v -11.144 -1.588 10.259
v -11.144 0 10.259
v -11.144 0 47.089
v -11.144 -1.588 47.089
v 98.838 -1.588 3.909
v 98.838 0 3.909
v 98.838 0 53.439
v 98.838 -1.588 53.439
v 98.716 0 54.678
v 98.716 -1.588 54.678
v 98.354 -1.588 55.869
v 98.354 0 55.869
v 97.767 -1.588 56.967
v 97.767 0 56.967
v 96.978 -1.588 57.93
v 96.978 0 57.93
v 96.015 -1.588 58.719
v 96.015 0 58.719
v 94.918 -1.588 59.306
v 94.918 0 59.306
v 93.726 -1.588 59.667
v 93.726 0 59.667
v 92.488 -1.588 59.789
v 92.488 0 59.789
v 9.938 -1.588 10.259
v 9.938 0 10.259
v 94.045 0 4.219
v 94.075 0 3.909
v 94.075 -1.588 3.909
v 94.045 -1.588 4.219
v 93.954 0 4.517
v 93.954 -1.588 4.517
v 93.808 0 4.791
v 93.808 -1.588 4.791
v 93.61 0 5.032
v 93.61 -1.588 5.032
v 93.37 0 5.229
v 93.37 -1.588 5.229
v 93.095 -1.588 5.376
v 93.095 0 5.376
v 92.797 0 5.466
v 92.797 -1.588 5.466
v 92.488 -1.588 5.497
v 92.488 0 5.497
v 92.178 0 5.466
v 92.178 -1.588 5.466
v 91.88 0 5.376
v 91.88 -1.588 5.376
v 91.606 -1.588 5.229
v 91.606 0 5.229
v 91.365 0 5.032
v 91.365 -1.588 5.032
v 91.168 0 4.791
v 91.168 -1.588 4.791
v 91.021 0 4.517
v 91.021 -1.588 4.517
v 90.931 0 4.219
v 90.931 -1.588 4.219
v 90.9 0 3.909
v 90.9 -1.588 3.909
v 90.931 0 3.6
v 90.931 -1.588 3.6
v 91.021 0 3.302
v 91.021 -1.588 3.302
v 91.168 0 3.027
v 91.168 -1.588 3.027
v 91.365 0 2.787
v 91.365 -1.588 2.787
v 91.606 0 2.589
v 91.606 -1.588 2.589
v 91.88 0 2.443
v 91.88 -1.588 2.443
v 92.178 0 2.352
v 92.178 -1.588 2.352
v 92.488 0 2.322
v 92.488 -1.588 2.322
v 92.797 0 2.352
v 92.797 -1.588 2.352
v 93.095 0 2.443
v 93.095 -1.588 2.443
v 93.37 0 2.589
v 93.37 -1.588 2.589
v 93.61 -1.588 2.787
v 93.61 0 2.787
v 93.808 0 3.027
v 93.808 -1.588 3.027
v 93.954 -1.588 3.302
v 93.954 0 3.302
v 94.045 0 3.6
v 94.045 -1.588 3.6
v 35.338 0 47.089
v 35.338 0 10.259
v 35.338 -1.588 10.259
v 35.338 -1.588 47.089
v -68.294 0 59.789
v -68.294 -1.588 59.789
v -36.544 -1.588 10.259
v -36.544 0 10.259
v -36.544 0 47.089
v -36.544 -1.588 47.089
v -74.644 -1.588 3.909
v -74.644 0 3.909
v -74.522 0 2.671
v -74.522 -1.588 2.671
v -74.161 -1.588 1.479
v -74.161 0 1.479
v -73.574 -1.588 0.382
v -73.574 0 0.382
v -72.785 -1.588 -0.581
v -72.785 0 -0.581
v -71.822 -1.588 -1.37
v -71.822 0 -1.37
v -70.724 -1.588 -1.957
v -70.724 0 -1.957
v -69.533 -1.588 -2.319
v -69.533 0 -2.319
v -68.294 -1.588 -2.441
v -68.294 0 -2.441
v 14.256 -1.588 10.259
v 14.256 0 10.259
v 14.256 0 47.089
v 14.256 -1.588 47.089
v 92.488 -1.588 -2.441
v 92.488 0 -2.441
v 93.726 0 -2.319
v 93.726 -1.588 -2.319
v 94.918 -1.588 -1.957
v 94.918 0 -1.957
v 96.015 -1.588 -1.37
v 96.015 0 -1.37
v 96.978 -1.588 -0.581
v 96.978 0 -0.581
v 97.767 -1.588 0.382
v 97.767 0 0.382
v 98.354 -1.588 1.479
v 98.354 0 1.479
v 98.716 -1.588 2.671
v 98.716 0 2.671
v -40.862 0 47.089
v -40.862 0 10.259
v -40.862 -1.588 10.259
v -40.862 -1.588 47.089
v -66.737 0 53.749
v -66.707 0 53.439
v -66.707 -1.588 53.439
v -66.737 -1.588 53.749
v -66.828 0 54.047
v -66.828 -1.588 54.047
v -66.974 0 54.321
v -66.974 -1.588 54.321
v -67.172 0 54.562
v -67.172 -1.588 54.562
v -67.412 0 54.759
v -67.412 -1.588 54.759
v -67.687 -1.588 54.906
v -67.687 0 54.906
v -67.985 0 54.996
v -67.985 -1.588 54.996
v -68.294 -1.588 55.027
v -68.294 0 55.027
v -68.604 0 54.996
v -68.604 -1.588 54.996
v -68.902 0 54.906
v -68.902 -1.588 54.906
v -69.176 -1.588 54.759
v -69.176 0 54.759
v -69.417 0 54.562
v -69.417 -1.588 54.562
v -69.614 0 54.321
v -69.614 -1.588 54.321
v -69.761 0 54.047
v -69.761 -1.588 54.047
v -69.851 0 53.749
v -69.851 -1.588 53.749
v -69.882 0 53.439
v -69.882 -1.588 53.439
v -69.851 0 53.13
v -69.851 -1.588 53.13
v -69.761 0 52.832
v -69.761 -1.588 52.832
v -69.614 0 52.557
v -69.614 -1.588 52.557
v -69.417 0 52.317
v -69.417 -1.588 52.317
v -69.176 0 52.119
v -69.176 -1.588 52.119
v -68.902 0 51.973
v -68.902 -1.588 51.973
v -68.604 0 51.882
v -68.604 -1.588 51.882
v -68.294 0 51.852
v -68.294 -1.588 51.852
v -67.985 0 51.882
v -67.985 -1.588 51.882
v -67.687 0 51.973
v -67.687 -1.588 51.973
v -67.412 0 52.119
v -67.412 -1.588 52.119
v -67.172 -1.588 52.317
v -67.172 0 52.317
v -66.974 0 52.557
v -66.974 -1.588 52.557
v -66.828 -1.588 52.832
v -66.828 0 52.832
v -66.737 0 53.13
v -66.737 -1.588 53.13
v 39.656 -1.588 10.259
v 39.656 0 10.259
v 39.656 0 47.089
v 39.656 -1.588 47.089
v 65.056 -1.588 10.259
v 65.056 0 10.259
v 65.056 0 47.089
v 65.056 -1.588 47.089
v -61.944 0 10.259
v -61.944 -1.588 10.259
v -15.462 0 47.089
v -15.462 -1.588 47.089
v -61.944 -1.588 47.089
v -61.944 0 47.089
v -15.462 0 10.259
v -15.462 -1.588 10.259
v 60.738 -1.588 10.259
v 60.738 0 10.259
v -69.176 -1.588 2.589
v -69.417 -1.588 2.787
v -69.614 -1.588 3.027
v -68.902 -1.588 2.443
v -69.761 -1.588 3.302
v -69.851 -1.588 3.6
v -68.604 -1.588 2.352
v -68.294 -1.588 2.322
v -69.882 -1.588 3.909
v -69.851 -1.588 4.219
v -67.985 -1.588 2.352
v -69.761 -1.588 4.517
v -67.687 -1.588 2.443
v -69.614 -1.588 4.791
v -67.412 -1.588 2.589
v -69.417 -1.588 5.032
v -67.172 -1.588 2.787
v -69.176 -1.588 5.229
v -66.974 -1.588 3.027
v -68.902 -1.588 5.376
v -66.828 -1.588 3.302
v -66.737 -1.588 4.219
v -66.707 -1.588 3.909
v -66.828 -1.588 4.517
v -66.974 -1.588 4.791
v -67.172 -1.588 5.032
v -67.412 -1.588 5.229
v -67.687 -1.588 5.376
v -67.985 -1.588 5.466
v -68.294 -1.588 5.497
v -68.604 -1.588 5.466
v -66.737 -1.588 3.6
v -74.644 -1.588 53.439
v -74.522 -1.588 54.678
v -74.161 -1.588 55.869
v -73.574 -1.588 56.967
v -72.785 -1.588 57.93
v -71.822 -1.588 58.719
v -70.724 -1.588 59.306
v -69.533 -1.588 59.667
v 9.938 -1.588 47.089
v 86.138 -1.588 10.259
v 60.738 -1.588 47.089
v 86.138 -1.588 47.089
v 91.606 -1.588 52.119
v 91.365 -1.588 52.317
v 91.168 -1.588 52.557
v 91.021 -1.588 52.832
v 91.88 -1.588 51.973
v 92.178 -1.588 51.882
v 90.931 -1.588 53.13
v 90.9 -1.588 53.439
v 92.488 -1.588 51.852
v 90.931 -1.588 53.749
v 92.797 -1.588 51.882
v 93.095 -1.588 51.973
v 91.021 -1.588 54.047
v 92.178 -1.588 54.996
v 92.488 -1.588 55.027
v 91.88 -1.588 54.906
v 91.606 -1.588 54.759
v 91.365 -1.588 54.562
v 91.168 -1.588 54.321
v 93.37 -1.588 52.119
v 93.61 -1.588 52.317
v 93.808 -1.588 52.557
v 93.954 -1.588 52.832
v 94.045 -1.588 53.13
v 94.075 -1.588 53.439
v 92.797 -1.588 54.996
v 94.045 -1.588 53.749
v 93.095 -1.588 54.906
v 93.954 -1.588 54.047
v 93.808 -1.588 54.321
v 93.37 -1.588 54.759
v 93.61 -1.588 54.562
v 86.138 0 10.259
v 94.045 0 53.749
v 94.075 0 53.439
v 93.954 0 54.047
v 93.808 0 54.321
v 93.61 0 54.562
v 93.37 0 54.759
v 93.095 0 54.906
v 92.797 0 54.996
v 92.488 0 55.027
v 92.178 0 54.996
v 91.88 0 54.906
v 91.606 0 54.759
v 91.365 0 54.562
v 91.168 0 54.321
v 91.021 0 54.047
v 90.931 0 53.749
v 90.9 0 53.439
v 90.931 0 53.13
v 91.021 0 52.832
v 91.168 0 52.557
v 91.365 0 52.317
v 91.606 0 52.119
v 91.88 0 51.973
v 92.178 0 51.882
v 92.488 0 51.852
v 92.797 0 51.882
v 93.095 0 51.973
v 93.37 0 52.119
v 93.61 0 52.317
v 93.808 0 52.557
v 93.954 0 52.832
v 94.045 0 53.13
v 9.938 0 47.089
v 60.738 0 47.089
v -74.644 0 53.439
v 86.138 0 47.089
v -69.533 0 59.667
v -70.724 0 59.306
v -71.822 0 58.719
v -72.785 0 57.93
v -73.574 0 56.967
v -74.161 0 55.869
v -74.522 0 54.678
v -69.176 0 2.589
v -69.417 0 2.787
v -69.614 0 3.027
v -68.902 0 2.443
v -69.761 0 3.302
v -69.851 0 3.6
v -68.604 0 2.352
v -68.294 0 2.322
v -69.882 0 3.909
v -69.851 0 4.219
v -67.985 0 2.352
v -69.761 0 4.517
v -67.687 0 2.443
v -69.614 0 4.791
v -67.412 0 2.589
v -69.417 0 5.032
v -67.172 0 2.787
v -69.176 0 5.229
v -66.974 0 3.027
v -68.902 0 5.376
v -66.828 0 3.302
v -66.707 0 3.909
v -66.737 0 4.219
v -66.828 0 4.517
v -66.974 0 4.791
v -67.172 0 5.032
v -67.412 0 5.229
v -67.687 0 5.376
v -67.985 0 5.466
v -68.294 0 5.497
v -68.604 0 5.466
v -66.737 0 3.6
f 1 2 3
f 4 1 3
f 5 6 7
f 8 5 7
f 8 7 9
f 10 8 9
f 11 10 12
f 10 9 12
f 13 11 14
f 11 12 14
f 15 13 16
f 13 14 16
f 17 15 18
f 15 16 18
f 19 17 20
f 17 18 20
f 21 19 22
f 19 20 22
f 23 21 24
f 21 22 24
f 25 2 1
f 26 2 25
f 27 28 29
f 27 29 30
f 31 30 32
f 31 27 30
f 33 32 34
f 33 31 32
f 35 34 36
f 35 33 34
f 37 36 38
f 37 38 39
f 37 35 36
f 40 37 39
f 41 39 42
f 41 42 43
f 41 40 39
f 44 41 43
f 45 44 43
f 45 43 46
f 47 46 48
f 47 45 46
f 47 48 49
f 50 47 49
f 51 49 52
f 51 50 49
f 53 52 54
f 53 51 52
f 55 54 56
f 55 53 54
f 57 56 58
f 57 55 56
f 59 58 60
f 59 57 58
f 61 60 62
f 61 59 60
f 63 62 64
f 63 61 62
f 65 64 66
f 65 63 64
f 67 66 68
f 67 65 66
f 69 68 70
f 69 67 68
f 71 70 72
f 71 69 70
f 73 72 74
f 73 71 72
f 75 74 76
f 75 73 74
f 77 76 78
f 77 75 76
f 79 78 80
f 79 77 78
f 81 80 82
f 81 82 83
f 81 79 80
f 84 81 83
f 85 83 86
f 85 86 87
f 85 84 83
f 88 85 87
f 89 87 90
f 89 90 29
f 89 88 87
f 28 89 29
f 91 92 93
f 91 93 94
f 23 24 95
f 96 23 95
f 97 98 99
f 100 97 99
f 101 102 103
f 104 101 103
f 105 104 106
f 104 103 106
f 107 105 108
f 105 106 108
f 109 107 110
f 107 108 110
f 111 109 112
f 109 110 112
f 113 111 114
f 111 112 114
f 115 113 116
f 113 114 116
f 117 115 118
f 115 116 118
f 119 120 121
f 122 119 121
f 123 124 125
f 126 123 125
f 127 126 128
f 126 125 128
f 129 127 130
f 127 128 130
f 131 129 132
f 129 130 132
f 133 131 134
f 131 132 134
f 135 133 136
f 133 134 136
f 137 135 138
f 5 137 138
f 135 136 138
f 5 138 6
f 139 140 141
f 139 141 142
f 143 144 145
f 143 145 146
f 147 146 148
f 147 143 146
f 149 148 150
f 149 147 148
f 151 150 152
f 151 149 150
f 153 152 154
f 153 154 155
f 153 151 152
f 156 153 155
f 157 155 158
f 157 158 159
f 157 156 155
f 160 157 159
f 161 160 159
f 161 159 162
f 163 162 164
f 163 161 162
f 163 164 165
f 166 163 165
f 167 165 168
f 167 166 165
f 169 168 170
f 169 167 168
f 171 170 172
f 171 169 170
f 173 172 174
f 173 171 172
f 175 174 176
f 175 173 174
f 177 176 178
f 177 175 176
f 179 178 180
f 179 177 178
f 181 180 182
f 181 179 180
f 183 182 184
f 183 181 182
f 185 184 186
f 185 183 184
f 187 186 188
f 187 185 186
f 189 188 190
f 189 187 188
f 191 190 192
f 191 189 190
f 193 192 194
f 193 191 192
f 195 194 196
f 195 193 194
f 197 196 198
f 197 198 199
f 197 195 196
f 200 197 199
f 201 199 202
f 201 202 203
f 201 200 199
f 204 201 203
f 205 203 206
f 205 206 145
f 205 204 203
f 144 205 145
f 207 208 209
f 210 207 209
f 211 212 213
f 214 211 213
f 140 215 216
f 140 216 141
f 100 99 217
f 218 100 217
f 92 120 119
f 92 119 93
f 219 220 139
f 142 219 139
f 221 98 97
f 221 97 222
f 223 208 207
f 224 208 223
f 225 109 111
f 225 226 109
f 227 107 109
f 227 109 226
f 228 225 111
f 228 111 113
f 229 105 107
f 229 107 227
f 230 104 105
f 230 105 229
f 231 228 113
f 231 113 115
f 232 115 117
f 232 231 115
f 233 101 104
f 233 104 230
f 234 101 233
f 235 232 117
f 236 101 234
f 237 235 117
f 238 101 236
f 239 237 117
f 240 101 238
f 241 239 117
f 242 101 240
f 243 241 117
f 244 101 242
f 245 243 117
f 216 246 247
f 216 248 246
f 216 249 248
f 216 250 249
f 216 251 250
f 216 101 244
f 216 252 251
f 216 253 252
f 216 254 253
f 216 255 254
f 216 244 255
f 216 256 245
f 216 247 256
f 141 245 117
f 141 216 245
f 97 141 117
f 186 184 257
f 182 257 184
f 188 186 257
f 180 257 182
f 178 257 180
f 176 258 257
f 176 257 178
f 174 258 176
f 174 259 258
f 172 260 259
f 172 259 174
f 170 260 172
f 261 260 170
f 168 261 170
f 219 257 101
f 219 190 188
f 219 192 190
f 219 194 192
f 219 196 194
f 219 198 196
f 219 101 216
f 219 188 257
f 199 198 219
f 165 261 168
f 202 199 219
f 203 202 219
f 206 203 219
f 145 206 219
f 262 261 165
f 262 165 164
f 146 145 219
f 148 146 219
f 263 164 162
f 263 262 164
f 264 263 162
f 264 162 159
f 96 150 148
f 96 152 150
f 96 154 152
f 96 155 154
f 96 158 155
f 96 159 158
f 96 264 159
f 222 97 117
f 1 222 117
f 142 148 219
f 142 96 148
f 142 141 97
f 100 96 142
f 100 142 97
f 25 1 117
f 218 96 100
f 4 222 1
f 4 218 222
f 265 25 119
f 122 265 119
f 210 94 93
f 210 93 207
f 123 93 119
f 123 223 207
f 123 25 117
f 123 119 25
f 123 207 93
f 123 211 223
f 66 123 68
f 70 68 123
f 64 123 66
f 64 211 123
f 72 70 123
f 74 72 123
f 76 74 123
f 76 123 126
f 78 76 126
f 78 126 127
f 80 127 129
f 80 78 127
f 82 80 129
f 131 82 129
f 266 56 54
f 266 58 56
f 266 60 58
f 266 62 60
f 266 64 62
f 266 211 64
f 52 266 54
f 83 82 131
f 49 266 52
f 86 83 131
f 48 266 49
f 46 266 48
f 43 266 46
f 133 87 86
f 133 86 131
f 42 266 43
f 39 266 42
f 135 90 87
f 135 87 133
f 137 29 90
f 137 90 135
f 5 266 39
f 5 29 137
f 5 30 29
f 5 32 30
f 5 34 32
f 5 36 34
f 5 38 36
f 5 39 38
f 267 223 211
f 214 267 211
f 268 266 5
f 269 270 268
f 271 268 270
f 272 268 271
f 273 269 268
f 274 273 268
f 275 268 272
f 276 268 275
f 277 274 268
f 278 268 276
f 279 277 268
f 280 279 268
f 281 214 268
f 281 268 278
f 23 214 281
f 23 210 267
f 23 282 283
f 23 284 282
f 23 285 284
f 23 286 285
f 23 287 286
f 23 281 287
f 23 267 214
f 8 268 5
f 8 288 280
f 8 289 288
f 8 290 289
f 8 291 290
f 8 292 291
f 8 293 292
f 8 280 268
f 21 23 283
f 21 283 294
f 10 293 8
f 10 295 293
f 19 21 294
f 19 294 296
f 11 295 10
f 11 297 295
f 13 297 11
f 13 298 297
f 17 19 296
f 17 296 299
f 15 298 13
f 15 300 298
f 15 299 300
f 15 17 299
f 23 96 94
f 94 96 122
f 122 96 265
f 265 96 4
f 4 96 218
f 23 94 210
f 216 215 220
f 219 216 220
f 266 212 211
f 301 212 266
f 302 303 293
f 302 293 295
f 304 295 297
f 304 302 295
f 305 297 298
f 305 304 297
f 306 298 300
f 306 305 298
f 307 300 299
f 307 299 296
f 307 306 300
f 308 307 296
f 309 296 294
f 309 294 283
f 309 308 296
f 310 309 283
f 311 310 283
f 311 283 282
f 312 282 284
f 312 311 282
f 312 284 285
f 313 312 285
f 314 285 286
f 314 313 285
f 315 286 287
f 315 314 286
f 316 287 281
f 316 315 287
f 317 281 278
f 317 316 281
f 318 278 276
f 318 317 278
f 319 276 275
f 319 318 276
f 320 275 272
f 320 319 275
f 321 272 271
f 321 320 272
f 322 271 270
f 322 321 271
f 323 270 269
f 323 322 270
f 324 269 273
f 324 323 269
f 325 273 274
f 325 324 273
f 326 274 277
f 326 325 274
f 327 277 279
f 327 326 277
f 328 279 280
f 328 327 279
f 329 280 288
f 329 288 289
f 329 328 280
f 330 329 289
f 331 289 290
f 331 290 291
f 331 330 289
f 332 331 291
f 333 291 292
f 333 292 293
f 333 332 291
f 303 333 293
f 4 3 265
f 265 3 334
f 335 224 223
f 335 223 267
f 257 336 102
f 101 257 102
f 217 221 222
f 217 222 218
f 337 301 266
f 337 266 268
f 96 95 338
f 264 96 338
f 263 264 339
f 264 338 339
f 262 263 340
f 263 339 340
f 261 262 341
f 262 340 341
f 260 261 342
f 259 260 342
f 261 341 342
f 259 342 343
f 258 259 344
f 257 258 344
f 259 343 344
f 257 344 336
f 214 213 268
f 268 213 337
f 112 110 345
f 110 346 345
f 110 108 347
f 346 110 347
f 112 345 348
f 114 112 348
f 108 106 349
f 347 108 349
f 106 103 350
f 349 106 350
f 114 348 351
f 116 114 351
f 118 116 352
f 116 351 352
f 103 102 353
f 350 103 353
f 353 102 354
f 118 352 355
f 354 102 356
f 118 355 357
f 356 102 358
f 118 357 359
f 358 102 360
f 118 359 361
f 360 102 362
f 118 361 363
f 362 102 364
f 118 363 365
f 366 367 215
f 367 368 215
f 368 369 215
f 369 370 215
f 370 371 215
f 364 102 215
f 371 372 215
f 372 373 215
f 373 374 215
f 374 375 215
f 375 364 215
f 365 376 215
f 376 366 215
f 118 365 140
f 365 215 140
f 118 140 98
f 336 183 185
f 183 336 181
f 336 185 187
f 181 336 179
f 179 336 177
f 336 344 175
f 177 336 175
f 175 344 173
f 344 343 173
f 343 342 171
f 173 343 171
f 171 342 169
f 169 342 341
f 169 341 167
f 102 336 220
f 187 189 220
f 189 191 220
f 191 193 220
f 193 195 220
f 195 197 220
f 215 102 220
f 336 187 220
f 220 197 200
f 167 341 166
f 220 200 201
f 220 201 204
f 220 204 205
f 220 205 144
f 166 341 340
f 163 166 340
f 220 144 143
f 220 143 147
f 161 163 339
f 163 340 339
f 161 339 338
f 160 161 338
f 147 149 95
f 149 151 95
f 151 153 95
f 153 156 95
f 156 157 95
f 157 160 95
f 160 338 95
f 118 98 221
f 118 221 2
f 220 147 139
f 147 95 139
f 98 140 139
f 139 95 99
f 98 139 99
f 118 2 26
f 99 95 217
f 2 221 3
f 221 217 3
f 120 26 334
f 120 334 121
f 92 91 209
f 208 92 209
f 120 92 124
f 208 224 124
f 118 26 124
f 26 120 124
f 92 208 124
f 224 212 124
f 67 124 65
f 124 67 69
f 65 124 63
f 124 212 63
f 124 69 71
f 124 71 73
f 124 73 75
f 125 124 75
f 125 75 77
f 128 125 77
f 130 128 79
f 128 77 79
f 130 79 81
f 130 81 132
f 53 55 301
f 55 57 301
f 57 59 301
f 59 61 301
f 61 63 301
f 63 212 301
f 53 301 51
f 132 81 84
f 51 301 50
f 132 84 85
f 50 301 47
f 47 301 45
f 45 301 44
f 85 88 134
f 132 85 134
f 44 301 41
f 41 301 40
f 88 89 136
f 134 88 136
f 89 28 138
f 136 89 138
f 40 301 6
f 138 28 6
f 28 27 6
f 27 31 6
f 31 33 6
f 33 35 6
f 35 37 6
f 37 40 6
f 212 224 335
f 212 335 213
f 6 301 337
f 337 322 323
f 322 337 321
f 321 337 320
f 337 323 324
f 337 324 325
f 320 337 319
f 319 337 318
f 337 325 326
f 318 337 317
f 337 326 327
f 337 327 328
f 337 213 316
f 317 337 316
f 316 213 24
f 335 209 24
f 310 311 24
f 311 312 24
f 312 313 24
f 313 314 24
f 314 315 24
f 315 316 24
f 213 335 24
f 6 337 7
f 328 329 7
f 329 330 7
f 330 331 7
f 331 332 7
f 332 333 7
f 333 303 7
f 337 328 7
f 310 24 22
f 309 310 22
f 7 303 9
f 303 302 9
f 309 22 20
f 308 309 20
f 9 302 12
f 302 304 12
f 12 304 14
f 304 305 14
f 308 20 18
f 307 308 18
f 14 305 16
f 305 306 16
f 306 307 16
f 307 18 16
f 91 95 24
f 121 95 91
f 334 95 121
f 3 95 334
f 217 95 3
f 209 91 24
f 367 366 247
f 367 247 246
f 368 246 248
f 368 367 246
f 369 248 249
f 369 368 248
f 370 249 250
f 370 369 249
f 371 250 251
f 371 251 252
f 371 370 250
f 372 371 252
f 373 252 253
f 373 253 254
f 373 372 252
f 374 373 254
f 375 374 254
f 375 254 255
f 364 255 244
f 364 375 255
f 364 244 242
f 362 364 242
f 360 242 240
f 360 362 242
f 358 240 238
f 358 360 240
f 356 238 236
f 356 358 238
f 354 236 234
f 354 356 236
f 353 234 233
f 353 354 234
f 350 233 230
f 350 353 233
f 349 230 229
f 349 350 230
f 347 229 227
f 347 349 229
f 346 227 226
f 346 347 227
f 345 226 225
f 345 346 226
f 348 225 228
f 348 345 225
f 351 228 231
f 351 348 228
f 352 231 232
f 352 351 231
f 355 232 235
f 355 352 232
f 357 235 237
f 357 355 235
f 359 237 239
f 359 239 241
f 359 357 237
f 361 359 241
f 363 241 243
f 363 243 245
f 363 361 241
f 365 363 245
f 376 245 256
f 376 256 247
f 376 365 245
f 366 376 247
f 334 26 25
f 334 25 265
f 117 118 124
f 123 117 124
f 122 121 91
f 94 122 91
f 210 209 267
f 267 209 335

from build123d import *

# Parameters (mm, degrees)
F0_R     = 1.5875
F0_W     = 21.082
F0_H     = 36.83
F1_DEPTH = 1.5875


with BuildPart() as f1:
    # F0 (on Front) → F1 (new body)
    with BuildSketch(Plane.XZ):
        with BuildLine():
            Line((92.487544, 59.78945), (-68.294456, 59.78945))
            ThreePointArc((-68.294456, 59.78945), (-72.784584, 57.929578), (-74.644456, 53.43945))
            Line((-74.644456, 53.43945), (-74.644456, 3.90945))
            ThreePointArc((-74.644456, 3.90945), (-72.784584, -0.580678), (-68.294456, -2.44055))
            Line((-68.294456, -2.44055), (92.487544, -2.44055))
            ThreePointArc((92.487544, -2.44055), (96.977672, -0.580678), (98.837544, 3.90945))
            Line((98.837544, 3.90945), (98.837544, 53.43945))
            ThreePointArc((98.837544, 53.43945), (96.977672, 57.929578), (92.487544, 59.78945))
        make_face()
        with Locations((-68.294456, 3.90945)):
            Circle(F0_R, mode=Mode.SUBTRACT)
        with Locations((92.487544, 3.90945)):
            Circle(F0_R, mode=Mode.SUBTRACT)
        with Locations((-51.403456, 28.67445)):
            Rectangle(F0_W, F0_H, mode=Mode.SUBTRACT)
        with Locations((-26.003456, 28.67445)):
            Rectangle(F0_W, F0_H, mode=Mode.SUBTRACT)
        with Locations((-0.603456, 28.67445)):
            Rectangle(F0_W, F0_H, mode=Mode.SUBTRACT)
        with Locations((-68.294456, 53.43945)):
            Circle(F0_R, mode=Mode.SUBTRACT)
        with Locations((24.796544, 28.67445)):
            Rectangle(F0_W, F0_H, mode=Mode.SUBTRACT)
        with Locations((50.196544, 28.67445)):
            Rectangle(F0_W, F0_H, mode=Mode.SUBTRACT)
        with Locations((75.596544, 28.67445)):
            Rectangle(F0_W, F0_H, mode=Mode.SUBTRACT)
        with Locations((92.487544, 53.43945)):
            Circle(F0_R, mode=Mode.SUBTRACT)
    extrude(amount=F1_DEPTH)


solid = f1.part
